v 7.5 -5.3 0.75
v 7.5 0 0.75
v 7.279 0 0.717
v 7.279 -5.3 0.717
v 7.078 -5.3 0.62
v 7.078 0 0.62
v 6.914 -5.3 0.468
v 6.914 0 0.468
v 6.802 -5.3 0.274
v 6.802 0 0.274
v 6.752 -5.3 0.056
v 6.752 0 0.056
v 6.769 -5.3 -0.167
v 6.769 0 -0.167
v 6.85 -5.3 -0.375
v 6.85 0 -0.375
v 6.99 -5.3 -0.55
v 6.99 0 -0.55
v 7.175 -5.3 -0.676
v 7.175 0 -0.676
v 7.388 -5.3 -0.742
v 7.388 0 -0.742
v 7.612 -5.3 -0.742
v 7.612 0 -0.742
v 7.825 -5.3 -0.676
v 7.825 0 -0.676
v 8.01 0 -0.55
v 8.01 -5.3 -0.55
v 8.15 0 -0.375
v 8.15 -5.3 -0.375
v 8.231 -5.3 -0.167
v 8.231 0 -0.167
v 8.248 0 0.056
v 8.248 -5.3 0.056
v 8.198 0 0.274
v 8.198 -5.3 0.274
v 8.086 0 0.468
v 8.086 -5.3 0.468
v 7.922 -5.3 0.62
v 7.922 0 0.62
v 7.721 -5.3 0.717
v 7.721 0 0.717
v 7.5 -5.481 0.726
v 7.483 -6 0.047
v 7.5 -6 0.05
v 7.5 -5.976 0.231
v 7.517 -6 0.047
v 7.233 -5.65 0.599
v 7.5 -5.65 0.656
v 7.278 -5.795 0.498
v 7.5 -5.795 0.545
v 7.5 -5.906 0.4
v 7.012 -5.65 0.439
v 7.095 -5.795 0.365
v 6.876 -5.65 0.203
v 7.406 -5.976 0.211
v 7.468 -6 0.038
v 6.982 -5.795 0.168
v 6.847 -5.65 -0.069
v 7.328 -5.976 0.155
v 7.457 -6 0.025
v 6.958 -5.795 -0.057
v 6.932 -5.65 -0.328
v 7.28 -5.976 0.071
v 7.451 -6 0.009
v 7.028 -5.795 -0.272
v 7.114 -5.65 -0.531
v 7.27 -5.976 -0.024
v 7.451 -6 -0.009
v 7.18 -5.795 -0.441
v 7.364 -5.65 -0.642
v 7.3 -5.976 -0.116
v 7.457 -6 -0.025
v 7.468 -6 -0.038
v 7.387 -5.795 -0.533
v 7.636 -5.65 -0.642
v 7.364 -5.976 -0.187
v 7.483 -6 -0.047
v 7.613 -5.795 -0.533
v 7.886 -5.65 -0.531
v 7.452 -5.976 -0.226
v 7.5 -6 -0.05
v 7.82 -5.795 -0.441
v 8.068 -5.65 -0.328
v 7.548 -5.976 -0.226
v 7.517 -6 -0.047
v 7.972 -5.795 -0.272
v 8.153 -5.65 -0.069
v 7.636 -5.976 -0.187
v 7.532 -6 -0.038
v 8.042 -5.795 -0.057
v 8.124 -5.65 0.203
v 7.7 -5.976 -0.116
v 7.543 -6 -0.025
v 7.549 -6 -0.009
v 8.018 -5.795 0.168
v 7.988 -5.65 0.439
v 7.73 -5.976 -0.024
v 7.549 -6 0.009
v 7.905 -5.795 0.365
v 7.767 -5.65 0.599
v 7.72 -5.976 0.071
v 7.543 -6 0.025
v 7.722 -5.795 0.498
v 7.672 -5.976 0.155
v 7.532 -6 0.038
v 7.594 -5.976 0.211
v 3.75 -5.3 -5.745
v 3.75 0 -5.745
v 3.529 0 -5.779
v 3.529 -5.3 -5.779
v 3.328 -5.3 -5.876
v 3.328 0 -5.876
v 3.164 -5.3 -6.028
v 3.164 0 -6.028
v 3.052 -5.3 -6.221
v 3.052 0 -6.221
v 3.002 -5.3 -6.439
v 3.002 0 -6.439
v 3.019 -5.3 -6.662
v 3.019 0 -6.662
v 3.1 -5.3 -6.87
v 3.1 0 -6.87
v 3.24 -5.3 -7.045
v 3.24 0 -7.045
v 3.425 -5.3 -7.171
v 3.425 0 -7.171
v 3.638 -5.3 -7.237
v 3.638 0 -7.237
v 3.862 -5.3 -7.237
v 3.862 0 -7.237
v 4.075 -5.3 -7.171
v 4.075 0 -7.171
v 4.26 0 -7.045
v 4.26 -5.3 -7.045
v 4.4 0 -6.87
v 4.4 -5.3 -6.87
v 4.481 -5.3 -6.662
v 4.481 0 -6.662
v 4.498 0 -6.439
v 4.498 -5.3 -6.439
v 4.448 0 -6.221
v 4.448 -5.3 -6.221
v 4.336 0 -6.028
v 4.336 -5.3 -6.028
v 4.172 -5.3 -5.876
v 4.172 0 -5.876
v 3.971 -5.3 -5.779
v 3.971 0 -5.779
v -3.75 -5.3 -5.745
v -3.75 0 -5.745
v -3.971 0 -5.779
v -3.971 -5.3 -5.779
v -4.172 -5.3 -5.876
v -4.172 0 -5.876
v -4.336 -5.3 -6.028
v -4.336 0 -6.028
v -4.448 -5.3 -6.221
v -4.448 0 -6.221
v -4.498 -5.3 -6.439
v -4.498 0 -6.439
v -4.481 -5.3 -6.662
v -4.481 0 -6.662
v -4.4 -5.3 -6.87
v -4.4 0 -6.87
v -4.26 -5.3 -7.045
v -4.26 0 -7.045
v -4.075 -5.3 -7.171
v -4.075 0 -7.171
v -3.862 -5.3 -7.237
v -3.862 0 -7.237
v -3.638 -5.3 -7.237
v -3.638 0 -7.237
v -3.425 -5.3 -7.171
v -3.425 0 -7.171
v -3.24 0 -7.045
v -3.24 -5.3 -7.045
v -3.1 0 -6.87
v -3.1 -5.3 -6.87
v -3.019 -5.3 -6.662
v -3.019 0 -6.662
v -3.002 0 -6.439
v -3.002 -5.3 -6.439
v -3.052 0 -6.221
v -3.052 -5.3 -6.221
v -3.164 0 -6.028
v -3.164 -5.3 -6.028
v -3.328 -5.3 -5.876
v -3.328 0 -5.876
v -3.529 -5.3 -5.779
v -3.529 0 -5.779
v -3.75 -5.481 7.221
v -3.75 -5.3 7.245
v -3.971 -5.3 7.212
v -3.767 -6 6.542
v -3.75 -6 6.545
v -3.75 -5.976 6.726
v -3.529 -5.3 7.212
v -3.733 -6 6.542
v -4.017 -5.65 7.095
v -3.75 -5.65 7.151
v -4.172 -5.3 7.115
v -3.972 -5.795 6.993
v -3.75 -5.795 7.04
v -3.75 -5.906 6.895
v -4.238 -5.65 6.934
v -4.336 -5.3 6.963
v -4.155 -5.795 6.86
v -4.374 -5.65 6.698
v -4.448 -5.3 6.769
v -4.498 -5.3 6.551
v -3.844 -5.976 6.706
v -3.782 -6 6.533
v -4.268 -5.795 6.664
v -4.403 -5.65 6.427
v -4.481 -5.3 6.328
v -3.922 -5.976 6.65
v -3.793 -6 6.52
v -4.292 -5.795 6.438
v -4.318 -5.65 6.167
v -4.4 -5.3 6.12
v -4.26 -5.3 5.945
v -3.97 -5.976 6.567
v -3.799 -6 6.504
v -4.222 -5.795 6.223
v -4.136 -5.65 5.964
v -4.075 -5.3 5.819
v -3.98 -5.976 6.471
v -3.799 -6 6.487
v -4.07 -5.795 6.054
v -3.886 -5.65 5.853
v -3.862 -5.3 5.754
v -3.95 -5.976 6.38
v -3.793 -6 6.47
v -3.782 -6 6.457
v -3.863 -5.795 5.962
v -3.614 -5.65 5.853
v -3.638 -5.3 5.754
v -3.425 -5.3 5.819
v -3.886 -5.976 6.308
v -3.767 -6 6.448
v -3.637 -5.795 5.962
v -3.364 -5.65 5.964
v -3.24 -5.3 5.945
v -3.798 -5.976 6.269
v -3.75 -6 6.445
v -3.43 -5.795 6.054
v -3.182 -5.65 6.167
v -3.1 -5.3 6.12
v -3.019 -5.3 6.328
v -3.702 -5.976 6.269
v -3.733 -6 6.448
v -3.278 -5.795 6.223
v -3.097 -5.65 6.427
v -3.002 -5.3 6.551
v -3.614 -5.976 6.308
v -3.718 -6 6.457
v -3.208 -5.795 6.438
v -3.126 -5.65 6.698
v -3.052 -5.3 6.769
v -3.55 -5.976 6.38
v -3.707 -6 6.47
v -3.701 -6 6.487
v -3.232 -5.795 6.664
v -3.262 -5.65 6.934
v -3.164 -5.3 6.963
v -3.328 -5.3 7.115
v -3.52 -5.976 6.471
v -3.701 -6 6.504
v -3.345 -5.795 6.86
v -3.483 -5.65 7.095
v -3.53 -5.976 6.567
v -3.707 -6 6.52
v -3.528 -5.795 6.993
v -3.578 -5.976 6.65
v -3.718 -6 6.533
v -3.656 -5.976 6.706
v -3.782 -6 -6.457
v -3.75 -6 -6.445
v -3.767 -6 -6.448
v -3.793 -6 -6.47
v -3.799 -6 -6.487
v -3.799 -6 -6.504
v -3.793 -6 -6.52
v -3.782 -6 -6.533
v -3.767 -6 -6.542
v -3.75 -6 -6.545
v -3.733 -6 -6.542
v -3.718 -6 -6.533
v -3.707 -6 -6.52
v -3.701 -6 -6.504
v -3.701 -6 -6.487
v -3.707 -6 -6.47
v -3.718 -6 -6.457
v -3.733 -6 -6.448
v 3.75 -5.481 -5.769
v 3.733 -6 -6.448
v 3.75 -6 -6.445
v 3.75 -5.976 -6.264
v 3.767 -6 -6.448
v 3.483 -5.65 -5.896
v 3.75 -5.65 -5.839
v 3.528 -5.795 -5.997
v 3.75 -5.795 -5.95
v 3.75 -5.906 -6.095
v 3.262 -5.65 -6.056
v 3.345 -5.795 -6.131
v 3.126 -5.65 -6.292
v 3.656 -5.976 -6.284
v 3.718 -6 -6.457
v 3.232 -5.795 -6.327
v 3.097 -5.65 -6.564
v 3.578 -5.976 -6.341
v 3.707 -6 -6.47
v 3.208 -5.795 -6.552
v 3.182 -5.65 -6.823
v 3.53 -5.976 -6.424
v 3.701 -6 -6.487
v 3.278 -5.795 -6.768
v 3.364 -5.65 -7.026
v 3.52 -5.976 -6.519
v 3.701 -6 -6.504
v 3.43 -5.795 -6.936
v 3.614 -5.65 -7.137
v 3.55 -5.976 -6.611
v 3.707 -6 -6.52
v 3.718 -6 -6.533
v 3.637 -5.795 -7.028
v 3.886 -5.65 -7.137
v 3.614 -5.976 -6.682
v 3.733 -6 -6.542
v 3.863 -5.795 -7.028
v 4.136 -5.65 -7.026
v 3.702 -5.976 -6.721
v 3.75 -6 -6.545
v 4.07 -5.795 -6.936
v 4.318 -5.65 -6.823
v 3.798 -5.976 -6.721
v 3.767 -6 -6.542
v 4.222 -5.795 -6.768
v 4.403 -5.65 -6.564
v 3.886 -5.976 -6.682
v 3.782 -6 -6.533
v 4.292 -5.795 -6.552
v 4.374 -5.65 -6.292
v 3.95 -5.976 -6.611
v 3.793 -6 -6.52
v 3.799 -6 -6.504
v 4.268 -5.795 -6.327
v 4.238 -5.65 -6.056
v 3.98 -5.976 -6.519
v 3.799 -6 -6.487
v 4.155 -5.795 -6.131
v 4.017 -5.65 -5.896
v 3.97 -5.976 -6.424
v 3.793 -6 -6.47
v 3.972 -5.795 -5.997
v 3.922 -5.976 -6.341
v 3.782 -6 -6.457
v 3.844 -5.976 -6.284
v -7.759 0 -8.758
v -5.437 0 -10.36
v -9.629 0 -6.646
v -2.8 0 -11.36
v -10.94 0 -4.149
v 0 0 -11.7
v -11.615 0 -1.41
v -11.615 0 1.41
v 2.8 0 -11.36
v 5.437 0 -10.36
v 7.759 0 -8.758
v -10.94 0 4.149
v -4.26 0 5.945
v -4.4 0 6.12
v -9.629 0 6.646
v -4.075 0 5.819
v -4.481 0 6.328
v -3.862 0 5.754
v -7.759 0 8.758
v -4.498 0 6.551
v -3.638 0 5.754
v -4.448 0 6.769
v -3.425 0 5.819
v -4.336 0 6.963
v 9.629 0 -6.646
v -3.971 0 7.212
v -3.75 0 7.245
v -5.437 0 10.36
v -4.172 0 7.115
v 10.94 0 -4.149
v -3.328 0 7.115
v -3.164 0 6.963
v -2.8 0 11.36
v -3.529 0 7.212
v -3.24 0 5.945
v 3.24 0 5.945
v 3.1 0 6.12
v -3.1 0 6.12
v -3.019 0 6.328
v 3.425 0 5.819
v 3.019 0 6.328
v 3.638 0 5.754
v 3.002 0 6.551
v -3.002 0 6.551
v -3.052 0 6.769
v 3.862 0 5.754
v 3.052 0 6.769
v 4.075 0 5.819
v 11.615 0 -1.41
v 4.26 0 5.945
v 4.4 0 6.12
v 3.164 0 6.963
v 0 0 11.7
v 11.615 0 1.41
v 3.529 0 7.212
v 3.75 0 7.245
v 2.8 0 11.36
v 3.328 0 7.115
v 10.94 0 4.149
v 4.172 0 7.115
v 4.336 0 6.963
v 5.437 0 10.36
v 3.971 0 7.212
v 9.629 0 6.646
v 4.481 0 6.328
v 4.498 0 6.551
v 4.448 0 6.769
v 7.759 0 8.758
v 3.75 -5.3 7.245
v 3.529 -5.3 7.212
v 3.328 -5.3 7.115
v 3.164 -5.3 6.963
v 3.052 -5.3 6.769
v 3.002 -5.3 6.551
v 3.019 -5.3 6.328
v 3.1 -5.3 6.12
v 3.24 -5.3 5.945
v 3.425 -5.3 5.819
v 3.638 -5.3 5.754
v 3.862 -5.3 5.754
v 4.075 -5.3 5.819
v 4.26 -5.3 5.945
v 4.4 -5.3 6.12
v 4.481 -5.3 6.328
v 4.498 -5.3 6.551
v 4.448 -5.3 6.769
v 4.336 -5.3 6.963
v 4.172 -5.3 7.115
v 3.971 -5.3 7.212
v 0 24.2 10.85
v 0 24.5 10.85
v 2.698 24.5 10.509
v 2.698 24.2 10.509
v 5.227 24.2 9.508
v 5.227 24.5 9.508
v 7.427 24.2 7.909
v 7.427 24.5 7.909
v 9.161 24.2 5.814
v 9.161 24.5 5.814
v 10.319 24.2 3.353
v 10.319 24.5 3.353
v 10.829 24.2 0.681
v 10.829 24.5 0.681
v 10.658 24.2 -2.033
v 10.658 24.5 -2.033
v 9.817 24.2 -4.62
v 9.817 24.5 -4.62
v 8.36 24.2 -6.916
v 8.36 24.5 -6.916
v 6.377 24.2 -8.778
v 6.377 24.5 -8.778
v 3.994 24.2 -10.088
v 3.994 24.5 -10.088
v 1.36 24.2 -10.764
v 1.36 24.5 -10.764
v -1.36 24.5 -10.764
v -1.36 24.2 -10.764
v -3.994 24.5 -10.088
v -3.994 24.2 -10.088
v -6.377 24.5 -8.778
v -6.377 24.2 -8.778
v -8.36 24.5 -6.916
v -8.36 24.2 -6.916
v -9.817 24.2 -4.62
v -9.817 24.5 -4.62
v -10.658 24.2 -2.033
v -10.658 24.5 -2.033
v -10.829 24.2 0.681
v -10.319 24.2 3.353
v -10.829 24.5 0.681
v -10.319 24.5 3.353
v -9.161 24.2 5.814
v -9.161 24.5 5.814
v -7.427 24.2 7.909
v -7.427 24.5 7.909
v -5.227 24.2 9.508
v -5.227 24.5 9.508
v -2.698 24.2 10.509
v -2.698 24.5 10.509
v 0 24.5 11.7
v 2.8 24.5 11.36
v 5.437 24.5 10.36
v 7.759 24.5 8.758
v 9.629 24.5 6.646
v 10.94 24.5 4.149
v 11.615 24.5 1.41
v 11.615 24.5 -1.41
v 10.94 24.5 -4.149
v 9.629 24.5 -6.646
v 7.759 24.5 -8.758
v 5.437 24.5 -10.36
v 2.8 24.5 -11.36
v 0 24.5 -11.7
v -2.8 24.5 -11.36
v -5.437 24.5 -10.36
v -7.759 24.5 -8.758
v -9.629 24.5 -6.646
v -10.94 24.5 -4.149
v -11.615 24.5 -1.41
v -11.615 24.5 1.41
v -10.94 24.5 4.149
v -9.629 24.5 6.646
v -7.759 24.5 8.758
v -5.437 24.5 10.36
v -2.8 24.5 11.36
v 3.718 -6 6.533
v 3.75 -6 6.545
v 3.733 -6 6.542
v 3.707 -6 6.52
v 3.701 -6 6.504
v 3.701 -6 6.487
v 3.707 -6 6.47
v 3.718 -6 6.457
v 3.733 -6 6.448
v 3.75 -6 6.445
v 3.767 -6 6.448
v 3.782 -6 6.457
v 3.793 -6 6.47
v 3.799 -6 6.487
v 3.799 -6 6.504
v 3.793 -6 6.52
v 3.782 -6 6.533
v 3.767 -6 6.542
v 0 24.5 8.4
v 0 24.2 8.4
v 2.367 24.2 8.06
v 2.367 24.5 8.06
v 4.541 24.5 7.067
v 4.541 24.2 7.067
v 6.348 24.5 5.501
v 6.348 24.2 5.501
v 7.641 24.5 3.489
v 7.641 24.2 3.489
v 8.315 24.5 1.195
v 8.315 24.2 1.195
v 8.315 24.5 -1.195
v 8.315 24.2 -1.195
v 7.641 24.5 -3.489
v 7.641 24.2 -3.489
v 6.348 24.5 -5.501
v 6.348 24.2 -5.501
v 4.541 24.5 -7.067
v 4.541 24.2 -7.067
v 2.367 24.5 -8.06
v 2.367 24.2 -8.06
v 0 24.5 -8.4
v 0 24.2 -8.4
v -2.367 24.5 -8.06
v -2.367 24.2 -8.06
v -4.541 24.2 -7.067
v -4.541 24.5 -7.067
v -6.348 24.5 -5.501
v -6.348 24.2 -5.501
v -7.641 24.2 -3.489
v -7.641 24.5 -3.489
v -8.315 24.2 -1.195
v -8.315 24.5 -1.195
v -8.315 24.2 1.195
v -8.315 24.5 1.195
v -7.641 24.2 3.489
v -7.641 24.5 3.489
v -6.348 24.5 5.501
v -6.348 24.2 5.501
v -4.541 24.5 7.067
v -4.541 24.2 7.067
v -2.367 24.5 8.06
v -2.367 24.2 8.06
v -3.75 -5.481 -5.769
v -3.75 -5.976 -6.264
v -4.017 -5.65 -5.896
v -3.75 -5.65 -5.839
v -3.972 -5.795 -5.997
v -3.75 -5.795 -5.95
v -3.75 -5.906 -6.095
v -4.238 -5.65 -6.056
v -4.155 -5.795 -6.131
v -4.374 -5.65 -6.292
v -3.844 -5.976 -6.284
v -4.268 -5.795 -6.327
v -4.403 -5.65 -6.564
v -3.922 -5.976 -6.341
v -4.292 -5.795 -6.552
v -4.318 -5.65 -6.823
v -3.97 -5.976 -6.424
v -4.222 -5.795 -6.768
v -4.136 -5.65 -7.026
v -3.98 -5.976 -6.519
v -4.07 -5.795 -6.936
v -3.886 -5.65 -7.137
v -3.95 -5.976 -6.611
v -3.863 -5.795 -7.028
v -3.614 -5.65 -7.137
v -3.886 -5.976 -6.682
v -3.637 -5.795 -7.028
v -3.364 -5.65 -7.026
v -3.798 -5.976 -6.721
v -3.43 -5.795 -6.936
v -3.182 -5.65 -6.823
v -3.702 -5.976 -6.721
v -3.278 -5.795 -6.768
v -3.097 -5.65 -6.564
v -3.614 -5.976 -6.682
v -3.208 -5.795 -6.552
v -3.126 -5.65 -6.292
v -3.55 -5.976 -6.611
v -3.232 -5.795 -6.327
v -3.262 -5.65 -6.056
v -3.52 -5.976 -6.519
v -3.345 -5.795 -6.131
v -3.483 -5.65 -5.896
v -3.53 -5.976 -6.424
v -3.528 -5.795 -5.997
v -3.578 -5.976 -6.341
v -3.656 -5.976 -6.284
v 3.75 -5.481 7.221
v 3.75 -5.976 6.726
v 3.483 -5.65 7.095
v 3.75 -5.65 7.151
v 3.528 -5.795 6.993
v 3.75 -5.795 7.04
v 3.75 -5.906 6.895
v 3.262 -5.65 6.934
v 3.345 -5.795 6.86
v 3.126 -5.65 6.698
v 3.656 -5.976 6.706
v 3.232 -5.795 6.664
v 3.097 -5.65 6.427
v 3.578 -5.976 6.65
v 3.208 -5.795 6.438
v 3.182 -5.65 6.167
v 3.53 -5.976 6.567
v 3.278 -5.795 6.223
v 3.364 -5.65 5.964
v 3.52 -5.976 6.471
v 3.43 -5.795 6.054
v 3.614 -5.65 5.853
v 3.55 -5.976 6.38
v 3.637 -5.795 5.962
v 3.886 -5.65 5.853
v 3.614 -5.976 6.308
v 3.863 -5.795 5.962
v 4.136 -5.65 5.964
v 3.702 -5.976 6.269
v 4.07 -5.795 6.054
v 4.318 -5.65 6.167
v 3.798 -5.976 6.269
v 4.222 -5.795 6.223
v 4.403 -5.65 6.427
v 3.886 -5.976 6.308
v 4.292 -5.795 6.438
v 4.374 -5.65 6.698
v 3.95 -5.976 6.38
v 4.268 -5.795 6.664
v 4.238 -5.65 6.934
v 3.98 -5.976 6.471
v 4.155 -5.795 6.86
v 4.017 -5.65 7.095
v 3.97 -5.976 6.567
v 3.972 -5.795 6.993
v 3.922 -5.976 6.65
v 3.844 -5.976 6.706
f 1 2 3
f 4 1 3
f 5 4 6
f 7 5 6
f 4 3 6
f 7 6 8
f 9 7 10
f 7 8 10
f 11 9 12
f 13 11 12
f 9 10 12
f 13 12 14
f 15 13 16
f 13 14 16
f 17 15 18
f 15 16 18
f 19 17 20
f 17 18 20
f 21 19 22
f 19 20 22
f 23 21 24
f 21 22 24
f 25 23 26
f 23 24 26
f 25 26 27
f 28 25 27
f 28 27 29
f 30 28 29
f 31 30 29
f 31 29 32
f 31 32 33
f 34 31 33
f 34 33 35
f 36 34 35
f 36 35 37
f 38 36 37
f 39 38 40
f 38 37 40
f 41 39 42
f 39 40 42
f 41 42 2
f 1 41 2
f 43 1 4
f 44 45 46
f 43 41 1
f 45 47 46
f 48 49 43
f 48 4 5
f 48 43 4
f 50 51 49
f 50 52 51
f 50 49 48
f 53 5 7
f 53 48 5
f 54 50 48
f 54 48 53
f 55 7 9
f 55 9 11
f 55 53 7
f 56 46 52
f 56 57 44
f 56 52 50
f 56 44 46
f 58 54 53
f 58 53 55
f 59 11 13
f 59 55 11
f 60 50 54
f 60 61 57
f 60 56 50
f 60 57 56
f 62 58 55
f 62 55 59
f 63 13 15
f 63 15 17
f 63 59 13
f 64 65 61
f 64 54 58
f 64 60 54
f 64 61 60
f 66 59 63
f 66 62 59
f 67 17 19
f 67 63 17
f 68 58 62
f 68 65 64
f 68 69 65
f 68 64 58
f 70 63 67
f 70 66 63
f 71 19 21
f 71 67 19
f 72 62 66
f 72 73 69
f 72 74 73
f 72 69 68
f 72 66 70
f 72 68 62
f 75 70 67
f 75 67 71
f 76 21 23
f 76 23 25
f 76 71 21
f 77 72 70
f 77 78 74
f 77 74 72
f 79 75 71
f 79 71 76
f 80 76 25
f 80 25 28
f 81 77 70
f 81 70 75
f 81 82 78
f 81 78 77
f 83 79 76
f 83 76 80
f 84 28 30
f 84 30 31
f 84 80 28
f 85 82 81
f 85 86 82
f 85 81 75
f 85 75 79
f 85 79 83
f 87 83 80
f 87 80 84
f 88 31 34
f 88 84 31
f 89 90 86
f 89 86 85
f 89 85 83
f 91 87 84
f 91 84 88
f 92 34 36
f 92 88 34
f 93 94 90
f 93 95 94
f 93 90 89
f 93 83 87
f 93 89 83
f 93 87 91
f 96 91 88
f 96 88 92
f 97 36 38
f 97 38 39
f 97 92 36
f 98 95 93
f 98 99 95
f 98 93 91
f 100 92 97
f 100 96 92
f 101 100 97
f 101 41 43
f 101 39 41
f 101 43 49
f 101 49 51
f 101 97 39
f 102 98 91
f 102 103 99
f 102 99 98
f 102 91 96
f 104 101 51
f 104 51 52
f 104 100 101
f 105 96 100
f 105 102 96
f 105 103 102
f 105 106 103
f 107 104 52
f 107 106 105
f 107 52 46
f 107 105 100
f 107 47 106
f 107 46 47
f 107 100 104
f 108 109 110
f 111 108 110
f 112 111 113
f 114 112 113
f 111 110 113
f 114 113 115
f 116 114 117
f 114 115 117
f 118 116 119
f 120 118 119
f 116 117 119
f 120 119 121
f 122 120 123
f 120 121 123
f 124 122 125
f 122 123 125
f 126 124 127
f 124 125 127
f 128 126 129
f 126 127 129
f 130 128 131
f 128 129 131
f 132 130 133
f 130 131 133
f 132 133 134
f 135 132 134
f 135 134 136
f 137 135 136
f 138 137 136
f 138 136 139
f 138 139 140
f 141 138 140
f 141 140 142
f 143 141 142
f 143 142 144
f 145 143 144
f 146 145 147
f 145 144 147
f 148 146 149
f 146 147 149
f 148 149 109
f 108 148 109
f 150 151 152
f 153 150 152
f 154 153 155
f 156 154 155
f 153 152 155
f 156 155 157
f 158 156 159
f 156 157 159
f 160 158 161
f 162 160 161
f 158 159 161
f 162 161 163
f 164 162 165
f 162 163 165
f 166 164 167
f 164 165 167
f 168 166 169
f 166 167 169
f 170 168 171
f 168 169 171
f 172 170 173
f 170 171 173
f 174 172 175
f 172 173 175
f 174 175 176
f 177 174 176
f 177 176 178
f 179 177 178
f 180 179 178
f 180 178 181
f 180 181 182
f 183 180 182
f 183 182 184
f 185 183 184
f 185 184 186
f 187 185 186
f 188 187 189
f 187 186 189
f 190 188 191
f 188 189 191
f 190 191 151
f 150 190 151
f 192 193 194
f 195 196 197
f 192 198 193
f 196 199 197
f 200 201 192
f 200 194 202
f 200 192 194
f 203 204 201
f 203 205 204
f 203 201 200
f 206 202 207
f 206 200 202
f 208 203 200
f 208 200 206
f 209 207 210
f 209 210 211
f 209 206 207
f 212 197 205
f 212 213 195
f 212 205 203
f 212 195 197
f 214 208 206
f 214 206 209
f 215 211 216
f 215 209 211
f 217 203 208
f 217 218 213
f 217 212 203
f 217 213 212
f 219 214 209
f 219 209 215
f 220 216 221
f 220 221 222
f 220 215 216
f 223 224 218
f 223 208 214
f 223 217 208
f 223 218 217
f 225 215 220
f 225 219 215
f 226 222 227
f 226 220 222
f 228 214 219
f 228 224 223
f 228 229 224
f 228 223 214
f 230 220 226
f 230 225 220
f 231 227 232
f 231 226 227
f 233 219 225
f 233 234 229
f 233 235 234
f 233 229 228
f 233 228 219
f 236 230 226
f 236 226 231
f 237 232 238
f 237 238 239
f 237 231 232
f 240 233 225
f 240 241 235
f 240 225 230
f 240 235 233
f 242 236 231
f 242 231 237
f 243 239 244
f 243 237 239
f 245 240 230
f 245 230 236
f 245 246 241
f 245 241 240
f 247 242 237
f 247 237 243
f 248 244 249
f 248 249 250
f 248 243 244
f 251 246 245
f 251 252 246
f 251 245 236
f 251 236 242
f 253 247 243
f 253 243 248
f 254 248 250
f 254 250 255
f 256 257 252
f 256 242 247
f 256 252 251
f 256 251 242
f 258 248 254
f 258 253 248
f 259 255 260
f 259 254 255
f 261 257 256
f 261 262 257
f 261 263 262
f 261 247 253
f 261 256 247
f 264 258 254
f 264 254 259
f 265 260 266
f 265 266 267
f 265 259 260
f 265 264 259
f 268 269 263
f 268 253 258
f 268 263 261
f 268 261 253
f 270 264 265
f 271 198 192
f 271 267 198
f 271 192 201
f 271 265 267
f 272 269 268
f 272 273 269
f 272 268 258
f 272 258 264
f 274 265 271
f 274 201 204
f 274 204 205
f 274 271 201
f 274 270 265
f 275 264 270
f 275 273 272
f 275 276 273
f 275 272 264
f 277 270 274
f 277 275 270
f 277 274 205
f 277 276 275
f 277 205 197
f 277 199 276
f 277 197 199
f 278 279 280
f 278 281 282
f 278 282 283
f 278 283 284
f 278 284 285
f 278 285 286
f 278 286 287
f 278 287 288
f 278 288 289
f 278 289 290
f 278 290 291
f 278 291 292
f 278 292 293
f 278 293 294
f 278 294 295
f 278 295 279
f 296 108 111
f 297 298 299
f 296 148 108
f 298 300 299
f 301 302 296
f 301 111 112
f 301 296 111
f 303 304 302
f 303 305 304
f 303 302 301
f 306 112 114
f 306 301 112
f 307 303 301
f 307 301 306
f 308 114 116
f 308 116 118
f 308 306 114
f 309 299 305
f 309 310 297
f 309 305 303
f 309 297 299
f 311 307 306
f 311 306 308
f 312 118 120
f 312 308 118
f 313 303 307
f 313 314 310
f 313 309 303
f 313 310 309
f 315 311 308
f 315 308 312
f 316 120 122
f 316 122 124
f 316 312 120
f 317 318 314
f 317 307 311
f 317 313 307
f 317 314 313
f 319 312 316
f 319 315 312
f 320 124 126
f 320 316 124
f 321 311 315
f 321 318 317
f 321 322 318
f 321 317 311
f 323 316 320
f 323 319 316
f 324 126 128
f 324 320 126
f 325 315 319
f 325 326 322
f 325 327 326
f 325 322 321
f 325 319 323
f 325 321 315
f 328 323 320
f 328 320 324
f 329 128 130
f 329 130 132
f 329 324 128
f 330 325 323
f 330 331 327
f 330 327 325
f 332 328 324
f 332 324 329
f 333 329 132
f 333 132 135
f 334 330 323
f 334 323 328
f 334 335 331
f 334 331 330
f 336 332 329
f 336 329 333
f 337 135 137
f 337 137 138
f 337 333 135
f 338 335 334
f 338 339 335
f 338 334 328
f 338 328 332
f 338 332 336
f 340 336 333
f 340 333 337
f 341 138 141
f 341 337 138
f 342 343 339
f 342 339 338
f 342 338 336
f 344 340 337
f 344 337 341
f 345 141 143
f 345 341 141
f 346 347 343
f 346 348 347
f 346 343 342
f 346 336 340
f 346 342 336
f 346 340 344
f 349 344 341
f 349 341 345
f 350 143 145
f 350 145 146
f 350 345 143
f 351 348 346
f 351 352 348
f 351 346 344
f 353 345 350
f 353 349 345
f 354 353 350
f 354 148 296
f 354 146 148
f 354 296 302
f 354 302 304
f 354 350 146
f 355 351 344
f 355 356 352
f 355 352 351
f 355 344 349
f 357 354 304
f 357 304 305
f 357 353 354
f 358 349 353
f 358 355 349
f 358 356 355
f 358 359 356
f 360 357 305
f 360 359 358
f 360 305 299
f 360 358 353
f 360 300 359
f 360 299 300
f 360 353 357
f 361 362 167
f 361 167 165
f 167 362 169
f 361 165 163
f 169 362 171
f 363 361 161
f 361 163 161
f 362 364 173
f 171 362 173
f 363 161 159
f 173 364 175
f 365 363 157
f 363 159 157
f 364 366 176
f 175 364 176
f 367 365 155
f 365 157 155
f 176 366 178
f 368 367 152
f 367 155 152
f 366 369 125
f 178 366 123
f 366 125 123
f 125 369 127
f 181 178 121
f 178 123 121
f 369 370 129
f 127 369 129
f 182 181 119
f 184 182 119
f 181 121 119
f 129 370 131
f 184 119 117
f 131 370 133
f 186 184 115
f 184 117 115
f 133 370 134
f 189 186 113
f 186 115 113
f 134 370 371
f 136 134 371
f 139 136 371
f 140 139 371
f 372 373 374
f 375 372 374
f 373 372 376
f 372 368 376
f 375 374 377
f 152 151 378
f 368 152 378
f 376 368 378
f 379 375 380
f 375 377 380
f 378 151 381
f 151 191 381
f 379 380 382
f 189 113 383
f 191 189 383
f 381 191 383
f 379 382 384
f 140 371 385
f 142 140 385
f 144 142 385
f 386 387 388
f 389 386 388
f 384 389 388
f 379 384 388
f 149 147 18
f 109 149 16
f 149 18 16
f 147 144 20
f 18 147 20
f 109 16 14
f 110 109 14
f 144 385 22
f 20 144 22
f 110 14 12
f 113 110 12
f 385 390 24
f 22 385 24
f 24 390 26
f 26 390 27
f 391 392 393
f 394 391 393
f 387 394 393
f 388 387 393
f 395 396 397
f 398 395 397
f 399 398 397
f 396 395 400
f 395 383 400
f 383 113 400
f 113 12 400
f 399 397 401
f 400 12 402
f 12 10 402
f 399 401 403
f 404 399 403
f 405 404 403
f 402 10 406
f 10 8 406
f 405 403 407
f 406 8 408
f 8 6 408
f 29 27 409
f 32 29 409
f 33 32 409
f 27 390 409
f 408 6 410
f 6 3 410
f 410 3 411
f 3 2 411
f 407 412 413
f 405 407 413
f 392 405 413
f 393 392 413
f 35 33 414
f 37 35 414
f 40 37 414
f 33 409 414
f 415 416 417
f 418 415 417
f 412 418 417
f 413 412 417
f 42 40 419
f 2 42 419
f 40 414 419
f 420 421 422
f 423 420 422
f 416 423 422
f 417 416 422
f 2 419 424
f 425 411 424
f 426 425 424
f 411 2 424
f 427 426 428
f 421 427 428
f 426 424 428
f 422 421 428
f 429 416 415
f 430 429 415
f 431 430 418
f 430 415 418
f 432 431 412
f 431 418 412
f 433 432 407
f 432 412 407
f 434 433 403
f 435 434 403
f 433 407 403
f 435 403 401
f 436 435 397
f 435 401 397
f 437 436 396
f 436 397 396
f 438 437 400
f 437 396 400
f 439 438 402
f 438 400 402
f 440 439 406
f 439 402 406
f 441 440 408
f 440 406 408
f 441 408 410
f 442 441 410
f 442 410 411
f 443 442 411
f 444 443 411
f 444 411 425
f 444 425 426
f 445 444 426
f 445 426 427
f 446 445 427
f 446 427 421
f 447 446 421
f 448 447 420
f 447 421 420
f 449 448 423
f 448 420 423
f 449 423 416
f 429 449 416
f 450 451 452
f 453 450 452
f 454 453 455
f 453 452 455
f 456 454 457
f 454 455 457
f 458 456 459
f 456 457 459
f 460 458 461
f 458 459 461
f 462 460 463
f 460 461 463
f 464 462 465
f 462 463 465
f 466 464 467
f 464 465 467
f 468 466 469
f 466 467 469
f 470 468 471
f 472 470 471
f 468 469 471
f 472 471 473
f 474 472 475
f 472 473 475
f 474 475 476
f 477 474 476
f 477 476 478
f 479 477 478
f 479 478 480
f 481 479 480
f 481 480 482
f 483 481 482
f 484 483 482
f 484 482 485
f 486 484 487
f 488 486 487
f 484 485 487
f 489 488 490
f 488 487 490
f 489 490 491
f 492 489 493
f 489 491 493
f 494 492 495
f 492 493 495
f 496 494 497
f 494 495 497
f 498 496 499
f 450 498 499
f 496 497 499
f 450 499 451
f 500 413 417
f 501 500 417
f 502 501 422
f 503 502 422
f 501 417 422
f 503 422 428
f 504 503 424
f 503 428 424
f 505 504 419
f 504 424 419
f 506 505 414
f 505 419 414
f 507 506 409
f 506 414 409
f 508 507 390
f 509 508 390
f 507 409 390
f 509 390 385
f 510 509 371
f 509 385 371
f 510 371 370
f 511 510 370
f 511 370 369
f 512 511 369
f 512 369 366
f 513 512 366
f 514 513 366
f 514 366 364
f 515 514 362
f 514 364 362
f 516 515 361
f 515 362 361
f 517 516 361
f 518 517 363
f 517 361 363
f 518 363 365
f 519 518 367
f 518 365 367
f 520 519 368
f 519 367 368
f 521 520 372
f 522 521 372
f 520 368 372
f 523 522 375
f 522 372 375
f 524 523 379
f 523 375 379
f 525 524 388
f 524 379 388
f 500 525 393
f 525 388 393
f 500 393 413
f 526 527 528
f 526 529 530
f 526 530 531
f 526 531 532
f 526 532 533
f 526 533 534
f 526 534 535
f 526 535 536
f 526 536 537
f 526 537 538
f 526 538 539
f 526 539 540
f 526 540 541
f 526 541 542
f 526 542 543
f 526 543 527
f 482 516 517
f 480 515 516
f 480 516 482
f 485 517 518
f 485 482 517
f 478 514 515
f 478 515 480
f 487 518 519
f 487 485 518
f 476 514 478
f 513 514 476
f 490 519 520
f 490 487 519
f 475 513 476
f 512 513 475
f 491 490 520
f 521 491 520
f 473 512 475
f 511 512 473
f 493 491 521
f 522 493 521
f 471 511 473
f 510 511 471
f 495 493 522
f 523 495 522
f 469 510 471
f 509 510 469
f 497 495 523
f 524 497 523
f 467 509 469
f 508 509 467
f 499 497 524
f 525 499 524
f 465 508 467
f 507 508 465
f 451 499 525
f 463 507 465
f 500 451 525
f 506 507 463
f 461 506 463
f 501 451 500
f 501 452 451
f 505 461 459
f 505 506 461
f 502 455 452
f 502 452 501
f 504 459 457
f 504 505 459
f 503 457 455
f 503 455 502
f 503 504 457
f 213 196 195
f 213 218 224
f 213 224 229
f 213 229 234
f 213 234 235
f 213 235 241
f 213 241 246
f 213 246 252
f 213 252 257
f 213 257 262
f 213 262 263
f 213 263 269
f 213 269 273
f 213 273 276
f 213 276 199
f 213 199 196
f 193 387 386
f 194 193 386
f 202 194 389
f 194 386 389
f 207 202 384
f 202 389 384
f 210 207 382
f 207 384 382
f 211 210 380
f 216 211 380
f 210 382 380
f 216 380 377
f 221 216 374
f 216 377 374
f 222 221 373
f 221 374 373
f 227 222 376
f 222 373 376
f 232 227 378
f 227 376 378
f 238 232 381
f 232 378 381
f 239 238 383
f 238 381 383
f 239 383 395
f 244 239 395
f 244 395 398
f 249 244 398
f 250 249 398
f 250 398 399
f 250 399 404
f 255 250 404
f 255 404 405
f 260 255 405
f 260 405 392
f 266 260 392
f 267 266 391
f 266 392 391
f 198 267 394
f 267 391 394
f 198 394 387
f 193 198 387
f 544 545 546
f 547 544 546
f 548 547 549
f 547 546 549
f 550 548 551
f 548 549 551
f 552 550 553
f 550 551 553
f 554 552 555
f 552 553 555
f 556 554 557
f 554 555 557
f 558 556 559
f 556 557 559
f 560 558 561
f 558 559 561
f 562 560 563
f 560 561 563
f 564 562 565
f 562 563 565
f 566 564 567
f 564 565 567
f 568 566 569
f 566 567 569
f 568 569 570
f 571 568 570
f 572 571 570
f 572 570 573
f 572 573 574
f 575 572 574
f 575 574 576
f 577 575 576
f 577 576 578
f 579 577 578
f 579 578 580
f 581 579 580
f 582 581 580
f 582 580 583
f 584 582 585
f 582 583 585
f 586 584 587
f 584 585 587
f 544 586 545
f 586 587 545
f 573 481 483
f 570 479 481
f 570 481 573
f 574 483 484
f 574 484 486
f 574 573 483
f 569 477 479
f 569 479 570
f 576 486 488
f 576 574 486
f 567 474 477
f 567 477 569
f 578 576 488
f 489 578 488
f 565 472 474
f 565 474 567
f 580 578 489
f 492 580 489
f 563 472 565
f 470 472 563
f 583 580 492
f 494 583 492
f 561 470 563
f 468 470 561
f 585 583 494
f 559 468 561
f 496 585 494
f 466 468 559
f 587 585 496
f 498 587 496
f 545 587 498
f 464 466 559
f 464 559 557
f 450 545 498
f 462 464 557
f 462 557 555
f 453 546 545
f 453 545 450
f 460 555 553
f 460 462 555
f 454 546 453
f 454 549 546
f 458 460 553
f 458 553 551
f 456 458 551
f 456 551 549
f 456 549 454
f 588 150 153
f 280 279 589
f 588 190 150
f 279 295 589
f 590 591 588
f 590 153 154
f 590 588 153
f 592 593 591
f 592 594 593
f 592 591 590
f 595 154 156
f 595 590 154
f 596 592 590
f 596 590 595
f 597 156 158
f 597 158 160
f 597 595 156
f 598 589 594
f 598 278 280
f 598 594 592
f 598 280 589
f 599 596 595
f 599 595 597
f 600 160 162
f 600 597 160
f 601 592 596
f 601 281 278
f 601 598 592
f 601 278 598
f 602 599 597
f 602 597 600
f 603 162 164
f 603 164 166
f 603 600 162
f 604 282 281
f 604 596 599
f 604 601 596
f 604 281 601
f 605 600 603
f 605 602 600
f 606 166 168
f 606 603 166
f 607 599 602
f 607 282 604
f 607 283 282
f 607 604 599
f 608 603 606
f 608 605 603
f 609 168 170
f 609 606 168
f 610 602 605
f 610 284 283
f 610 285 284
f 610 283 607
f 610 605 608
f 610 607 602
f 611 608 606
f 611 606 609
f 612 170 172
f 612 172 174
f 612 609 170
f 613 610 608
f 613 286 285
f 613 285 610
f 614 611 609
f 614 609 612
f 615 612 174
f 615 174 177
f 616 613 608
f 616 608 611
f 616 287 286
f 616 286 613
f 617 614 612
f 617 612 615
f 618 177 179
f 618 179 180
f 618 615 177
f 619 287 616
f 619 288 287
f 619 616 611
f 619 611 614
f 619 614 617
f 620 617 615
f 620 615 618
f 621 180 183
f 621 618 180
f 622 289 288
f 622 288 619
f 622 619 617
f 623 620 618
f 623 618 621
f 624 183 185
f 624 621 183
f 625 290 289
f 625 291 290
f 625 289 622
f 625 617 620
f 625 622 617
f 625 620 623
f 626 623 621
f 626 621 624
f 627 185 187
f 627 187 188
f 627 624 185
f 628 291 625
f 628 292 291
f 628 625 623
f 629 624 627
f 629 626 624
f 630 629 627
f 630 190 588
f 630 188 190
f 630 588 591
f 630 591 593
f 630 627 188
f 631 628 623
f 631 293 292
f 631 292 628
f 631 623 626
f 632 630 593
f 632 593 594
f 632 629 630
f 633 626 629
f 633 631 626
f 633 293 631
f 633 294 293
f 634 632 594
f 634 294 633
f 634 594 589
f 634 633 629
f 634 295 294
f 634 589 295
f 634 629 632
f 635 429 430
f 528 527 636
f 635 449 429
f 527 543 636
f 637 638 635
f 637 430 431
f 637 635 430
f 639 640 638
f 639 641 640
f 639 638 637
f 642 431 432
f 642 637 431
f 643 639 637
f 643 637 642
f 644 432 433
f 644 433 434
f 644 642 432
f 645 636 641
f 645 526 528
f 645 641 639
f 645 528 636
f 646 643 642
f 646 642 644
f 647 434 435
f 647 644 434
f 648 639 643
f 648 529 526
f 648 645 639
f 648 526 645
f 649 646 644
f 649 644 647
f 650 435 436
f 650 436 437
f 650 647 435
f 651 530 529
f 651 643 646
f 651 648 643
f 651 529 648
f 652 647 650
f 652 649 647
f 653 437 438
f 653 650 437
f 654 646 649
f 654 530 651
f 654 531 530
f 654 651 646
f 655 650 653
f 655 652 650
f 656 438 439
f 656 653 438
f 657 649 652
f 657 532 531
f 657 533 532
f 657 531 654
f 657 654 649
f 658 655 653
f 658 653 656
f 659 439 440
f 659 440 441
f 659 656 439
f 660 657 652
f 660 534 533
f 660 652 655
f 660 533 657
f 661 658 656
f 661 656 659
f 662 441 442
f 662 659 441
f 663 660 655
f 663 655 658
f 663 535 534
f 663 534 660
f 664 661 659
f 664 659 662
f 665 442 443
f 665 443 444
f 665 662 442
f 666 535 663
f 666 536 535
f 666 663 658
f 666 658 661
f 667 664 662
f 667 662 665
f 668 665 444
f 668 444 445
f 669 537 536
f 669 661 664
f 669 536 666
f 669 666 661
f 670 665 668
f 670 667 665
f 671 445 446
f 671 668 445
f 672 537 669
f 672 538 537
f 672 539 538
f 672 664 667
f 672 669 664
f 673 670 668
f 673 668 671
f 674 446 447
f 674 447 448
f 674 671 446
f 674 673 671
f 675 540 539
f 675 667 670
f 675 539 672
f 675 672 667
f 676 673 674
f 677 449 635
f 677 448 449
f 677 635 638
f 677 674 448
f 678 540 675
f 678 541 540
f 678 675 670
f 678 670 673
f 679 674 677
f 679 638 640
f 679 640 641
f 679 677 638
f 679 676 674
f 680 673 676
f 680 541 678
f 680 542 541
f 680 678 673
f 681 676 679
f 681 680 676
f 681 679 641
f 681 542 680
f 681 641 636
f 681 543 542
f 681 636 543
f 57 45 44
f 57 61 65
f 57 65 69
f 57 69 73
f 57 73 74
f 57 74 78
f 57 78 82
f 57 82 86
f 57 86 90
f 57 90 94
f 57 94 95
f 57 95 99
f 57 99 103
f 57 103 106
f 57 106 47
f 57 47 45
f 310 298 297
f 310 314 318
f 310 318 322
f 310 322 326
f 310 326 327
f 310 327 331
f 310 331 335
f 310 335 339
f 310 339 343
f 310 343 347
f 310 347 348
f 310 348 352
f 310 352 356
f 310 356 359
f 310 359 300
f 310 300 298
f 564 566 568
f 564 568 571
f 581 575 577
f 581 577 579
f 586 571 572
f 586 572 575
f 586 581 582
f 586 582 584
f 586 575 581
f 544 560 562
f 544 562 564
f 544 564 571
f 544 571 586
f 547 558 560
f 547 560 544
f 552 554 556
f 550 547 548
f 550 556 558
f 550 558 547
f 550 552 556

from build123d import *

# Parameters (mm, degrees)
SKETCH1_R           = 11.7
BOSS_EXTRUDE1_DEPTH = 24.5
SKETCH2_R           = 10.85
CUT_EXTRUDE1_DEPTH  = 0.3
SKETCH3_R           = 8.4
BOSS_EXTRUDE2_DEPTH = 0.3
SKETCH6_R           = 0.75
BOSS_EXTRUDE3_DEPTH = 6
FILLET12_R          = 0.7


with BuildPart() as part:
    # Sketch1 → Boss-Extrude1 (new body)
    with BuildSketch(Plane(origin=(0, 0, 0), x_dir=(1, 0, 0), z_dir=(0, 1, 0))):
        with Locations(Location((0, 0, 0), (0, 0, 270))):
            Circle(SKETCH1_R)
    extrude(amount=BOSS_EXTRUDE1_DEPTH)

    # Sketch2 → Cut-Extrude1 (cut)
    with BuildSketch(Plane(origin=(0, 24.5, 0), x_dir=(1, 0, 0), z_dir=(0, 1, 0))):
        with Locations(Location((0, 0, 0), (0, 0, 270))):
            Circle(SKETCH2_R)
    extrude(amount=-CUT_EXTRUDE1_DEPTH, mode=Mode.SUBTRACT)

    # Sketch3 → Boss-Extrude2 (add)
    with BuildSketch(Plane(origin=(0, 24.2, 0), x_dir=(1, 0, 0), z_dir=(0, 1, 0))):
        with Locations(Location((0, 0, 0), (0, 0, 270))):
            Circle(SKETCH3_R)
    extrude(amount=BOSS_EXTRUDE2_DEPTH)

    # Sketch6 → Boss-Extrude3 (add)
    with BuildSketch(Plane.XZ):
        with Locations(Location((7.5, 0, 0), (0, 0, 90))):
            Circle(SKETCH6_R)
        with Locations(Location((3.75, 6.495190528, 0), (0, 0, 90))):
            Circle(SKETCH6_R)
        with Locations(Location((-3.75, 6.495190528, 0), (0, 0, 90))):
            Circle(SKETCH6_R)
        with Locations(Location((3.75, -6.495190528, 0), (0, 0, 90))):
            Circle(SKETCH6_R)
        with Locations(Location((-3.75, -6.495190528, 0), (0, 0, 90))):
            Circle(SKETCH6_R)
    extrude(amount=BOSS_EXTRUDE3_DEPTH)

    # Fillet12
    fillet12_edges = [part.edges().sort_by_distance(p)[0] for p in [
        (7.5, -6, -0.75),
        (3.75, -6, 5.745190528),
        (-3.75, -6, 5.745190528),
        (3.75, -6, -7.245190528),
        (-3.75, -6, -7.245190528),
    ]]
    fillet(fillet12_edges, radius=FILLET12_R)


solid = part.part
